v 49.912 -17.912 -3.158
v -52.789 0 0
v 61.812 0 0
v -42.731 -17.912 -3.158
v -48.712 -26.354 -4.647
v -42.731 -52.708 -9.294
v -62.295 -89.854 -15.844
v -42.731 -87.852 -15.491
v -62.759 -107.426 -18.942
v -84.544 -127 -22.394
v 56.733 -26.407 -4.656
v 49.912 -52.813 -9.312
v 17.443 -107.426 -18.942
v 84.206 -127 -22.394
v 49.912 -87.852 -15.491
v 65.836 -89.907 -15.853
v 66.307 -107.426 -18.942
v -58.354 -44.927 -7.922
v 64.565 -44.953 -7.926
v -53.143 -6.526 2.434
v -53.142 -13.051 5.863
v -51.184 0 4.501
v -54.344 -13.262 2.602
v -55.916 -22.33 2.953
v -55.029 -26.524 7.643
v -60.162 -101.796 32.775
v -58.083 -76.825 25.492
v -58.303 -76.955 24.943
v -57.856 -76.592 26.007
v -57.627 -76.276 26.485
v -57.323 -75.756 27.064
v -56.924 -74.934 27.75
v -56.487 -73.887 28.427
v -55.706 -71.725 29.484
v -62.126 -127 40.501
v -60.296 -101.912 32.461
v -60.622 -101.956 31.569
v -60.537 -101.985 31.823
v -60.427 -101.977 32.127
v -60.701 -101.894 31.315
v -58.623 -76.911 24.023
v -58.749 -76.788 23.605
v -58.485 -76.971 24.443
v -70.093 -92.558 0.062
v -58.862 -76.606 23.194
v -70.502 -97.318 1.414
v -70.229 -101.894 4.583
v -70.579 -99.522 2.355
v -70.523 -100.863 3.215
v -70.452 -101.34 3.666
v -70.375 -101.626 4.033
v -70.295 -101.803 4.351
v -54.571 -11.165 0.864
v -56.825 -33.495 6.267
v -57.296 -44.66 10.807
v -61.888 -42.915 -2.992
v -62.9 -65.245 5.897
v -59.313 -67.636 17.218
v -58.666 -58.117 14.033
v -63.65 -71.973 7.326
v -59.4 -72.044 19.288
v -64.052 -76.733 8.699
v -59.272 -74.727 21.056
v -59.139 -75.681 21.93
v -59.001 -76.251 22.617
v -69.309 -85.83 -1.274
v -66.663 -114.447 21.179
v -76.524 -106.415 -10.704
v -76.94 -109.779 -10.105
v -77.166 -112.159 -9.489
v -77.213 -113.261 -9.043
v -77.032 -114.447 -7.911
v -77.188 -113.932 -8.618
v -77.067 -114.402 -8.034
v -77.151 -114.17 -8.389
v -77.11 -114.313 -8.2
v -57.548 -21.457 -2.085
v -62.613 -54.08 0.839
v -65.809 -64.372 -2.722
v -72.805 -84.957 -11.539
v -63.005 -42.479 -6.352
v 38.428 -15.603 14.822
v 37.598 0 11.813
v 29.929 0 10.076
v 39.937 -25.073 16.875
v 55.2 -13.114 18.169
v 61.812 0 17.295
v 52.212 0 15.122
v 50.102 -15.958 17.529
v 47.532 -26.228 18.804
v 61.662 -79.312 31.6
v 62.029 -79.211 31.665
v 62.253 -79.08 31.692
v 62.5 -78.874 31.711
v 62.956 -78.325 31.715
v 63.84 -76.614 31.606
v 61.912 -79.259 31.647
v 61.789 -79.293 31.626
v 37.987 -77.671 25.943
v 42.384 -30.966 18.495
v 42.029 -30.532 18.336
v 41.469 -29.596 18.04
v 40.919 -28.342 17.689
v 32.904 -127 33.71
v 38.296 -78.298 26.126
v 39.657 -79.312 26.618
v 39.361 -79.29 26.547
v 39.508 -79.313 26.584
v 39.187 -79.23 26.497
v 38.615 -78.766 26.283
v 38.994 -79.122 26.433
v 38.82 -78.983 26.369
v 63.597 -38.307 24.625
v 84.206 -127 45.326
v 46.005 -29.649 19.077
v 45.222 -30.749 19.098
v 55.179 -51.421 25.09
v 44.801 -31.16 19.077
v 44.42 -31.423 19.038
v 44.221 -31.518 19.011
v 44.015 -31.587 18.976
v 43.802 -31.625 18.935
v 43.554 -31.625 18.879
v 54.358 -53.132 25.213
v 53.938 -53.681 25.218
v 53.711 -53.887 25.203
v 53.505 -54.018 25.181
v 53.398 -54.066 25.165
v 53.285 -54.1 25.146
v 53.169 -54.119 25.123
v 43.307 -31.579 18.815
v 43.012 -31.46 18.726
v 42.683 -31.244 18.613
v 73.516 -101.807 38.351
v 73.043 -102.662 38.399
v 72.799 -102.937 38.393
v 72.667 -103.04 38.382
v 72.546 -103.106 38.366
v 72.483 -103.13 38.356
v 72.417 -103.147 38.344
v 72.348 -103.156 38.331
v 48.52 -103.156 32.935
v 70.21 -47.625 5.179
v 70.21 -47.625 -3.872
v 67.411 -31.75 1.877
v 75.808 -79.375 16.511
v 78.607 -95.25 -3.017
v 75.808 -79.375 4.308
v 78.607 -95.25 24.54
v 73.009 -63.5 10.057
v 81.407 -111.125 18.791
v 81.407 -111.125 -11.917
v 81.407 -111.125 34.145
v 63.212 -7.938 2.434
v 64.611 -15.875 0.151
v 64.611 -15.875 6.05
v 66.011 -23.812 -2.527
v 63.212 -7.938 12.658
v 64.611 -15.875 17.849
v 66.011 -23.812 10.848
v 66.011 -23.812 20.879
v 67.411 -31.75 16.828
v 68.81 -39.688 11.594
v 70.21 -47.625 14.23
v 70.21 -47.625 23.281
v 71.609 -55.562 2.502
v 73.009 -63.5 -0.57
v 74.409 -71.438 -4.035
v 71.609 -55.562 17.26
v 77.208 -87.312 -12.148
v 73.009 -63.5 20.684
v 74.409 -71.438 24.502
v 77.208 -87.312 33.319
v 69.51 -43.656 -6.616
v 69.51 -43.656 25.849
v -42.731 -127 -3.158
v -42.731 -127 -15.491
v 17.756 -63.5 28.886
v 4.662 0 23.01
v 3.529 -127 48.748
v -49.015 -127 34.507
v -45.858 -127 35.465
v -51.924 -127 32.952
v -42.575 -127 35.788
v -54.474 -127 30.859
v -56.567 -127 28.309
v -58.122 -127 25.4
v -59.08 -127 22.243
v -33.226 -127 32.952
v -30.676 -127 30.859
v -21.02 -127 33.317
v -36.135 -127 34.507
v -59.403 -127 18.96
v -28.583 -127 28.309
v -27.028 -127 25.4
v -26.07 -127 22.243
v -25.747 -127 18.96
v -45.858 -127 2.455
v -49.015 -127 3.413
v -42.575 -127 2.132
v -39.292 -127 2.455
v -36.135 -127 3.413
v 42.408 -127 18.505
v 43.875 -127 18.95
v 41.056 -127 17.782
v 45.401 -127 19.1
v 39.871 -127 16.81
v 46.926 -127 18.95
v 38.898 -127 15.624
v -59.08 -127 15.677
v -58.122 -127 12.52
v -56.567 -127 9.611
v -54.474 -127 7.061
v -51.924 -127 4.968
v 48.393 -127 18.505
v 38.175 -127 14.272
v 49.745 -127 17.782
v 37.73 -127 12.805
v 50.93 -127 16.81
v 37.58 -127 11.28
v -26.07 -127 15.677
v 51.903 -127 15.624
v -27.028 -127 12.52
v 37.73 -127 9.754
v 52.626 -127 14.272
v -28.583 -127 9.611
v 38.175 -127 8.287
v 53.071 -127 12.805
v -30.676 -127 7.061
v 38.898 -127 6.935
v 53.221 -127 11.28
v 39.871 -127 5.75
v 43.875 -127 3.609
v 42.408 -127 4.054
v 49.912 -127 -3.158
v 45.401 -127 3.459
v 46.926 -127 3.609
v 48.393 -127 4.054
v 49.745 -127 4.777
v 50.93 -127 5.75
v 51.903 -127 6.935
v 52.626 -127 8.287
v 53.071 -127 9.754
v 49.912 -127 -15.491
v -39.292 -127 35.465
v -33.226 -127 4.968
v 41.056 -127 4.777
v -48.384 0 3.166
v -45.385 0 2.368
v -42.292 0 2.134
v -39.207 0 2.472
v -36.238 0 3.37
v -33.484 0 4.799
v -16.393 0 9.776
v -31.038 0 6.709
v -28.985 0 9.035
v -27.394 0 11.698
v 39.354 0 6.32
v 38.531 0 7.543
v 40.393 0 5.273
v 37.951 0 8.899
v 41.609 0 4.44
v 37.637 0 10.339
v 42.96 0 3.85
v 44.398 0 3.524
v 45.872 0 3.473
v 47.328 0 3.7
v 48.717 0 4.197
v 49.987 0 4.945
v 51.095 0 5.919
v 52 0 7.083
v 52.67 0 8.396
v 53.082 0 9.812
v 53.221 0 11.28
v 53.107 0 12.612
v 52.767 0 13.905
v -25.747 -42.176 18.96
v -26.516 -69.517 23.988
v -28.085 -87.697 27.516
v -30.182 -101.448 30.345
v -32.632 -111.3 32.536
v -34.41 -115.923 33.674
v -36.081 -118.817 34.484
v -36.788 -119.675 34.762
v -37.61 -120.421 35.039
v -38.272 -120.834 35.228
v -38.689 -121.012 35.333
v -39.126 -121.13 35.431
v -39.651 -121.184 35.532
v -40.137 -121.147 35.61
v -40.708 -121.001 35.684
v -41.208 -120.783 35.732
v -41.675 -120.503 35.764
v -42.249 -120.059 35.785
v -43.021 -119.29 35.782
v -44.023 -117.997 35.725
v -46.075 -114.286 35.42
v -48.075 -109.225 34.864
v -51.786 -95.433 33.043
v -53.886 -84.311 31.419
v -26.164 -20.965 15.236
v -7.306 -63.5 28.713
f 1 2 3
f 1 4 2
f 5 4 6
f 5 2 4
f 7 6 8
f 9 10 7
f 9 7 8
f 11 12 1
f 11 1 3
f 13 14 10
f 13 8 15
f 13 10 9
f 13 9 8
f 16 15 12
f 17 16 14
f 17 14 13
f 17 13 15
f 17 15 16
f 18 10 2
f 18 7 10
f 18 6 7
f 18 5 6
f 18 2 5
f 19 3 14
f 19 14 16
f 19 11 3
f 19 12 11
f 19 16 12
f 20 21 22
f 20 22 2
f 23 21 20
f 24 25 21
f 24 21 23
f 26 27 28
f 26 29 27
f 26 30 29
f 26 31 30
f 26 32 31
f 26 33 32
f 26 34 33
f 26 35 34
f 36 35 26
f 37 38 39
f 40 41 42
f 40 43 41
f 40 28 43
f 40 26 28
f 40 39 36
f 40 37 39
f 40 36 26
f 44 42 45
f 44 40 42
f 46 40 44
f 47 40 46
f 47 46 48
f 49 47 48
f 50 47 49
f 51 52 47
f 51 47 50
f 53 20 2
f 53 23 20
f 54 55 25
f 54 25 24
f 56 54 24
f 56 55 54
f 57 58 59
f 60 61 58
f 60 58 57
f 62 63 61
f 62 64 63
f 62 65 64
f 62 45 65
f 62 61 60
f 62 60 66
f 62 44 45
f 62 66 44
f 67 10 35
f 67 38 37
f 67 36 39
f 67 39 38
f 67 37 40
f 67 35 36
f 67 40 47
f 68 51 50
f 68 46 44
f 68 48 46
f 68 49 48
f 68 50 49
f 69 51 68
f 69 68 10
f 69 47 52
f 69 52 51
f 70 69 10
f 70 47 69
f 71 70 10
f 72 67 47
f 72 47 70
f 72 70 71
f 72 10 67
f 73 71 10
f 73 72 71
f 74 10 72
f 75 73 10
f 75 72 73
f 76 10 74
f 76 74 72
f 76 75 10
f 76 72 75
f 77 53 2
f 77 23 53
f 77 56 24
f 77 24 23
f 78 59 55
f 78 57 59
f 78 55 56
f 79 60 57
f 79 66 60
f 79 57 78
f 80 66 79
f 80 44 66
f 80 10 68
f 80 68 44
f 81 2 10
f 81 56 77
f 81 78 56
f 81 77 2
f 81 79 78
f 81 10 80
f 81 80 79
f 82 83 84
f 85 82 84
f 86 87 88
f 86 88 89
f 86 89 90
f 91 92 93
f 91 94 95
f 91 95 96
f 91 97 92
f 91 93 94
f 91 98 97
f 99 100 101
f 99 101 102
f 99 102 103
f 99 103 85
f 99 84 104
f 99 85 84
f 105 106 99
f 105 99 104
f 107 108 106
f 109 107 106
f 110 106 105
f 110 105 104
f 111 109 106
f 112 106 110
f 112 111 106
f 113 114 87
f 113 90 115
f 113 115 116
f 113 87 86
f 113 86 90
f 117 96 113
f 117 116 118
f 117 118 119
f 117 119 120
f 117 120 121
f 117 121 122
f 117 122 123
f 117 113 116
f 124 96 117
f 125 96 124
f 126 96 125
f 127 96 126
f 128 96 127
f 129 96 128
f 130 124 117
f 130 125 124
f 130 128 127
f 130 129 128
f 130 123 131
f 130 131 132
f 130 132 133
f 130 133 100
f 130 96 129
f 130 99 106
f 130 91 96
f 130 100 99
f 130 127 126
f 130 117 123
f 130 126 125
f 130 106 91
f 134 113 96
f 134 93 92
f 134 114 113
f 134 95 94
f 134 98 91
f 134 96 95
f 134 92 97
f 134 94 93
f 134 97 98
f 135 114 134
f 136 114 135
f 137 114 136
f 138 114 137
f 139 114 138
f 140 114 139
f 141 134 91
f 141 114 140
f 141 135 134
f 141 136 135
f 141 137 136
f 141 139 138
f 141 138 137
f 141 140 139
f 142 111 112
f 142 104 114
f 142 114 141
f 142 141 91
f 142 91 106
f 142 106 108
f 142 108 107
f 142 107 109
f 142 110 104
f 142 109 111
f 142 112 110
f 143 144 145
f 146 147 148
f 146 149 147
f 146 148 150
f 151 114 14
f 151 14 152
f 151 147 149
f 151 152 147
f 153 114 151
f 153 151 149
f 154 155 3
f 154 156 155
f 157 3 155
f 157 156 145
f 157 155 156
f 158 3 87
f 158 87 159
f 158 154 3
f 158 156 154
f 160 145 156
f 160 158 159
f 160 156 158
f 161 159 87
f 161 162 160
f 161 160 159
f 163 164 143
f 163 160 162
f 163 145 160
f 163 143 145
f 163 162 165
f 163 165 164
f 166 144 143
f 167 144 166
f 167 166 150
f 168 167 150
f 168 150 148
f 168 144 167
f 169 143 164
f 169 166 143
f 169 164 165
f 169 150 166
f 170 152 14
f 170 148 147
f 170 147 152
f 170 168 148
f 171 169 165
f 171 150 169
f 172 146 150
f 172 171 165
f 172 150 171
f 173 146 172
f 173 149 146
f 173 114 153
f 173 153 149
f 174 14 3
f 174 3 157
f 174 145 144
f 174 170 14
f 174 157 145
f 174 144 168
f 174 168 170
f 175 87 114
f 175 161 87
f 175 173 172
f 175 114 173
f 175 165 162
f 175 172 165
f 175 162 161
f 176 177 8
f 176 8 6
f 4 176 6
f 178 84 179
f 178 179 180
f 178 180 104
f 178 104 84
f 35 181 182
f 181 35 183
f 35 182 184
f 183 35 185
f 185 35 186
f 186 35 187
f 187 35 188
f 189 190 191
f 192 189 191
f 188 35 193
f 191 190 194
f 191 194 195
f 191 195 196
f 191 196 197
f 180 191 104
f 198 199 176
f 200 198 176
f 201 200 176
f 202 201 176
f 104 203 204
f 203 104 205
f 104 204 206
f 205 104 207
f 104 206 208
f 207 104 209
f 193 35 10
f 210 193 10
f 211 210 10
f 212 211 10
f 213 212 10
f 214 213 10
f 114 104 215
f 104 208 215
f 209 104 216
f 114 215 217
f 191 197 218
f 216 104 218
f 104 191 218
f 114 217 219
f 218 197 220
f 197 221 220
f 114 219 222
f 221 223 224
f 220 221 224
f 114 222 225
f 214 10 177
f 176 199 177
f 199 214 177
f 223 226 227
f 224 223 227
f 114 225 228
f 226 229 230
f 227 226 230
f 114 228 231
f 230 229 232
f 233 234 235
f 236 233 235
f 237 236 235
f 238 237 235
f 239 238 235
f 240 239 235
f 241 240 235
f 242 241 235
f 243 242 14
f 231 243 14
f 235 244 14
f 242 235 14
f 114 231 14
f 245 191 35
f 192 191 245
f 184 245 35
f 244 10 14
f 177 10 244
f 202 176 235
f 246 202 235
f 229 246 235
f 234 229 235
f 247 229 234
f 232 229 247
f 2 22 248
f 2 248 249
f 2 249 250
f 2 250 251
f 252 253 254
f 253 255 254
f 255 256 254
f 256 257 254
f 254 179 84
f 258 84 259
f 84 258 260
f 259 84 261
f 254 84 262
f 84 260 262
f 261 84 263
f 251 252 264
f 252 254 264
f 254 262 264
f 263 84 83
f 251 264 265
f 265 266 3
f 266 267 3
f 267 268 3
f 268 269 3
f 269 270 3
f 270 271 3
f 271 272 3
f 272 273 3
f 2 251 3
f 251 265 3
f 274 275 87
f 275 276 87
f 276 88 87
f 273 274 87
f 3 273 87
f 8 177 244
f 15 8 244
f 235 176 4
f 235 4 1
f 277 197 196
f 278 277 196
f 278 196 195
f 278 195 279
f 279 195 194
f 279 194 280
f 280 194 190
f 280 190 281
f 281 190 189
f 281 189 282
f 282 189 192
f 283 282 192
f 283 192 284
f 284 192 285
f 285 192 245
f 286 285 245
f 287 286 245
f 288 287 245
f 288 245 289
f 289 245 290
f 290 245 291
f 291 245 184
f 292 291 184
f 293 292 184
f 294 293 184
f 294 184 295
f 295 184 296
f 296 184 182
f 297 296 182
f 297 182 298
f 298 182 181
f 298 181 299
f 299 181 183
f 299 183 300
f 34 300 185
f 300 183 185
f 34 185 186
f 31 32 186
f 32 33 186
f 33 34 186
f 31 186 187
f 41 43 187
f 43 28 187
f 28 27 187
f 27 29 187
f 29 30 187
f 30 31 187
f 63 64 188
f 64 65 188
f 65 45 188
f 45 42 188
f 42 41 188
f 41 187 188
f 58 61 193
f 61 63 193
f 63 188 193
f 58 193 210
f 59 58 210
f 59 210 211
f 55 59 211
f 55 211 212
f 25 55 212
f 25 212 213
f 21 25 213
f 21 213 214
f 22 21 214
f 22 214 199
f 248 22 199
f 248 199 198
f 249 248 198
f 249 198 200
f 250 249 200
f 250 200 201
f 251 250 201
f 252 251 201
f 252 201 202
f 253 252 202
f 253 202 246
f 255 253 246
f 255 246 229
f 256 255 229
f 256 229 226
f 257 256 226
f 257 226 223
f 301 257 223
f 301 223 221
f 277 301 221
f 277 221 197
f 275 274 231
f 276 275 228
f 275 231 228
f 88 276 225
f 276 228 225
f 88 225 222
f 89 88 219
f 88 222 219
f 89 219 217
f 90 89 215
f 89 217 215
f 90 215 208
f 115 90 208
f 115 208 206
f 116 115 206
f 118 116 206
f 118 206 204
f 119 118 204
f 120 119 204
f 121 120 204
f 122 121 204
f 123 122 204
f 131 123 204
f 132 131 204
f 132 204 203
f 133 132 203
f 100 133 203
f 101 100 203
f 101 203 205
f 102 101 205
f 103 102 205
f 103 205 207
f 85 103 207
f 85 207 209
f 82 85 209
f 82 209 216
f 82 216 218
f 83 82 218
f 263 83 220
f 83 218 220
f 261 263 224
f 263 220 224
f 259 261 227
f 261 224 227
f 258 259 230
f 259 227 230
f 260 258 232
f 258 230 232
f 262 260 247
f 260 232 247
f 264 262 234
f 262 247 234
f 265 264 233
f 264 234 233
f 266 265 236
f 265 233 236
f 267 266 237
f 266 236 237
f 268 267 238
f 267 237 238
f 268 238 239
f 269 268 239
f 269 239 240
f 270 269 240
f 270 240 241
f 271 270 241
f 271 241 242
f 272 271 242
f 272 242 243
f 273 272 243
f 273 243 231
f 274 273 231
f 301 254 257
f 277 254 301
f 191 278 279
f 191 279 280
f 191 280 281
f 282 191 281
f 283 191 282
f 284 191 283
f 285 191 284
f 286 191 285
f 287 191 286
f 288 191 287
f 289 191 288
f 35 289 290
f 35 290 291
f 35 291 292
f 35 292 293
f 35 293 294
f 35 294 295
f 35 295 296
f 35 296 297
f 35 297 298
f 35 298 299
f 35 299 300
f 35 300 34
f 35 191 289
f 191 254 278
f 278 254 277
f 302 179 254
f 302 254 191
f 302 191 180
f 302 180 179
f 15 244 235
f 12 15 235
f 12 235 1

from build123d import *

# Parameters (mm, degrees)
F1_DEPTH = 127
F1_TAPER = -10
F2_R     = 7.8205252783
F3_DEPTH = 127.0010001
F4_R     = 16.8280941537
F5_DEPTH = 127.0010001
F6_W     = 92.6431566477
F6_H     = 12.3323691078
F7_DEPTH = 127.0010001


with BuildPart() as f1:
    # F0 (on Front) → F1 (new body)
    with BuildSketch(Plane.XZ):
        Polygon((-16.393026337, 9.7756581381), (-47.3743416369, 15.1898693293), (-52.7885518968, 0), (61.8122331798, 0), (61.8122331798, 17.2953940928), (29.9285557121, 10.07644739), (4.6622389928, 23.0103954673), align=None)
    extrude(amount=F1_DEPTH, taper=F1_TAPER)

    # F2 (on face) → F3 (cut, through all)
    with BuildSketch(Plane.XZ.offset(127)):
        with Locations((45.4005300999, 11.279605329)):
            Circle(F2_R)
    extrude(amount=-F3_DEPTH, mode=Mode.SUBTRACT)

    # F4 (on face) → F5 (cut, through all)
    with BuildSketch(Plane.XZ.offset(127)):
        with Locations((-42.574852705, 18.9597774297)):
            Circle(F4_R)
    extrude(amount=-F5_DEPTH, mode=Mode.SUBTRACT)

    # F6 (on face) → F7 (cut, through all)
    with BuildSketch(Plane.XZ.offset(127)):
        with Locations((3.5907924175, -9.3244740274)):
            Rectangle(F6_W, F6_H)
    extrude(amount=-F7_DEPTH, mode=Mode.SUBTRACT)


solid = f1.part
